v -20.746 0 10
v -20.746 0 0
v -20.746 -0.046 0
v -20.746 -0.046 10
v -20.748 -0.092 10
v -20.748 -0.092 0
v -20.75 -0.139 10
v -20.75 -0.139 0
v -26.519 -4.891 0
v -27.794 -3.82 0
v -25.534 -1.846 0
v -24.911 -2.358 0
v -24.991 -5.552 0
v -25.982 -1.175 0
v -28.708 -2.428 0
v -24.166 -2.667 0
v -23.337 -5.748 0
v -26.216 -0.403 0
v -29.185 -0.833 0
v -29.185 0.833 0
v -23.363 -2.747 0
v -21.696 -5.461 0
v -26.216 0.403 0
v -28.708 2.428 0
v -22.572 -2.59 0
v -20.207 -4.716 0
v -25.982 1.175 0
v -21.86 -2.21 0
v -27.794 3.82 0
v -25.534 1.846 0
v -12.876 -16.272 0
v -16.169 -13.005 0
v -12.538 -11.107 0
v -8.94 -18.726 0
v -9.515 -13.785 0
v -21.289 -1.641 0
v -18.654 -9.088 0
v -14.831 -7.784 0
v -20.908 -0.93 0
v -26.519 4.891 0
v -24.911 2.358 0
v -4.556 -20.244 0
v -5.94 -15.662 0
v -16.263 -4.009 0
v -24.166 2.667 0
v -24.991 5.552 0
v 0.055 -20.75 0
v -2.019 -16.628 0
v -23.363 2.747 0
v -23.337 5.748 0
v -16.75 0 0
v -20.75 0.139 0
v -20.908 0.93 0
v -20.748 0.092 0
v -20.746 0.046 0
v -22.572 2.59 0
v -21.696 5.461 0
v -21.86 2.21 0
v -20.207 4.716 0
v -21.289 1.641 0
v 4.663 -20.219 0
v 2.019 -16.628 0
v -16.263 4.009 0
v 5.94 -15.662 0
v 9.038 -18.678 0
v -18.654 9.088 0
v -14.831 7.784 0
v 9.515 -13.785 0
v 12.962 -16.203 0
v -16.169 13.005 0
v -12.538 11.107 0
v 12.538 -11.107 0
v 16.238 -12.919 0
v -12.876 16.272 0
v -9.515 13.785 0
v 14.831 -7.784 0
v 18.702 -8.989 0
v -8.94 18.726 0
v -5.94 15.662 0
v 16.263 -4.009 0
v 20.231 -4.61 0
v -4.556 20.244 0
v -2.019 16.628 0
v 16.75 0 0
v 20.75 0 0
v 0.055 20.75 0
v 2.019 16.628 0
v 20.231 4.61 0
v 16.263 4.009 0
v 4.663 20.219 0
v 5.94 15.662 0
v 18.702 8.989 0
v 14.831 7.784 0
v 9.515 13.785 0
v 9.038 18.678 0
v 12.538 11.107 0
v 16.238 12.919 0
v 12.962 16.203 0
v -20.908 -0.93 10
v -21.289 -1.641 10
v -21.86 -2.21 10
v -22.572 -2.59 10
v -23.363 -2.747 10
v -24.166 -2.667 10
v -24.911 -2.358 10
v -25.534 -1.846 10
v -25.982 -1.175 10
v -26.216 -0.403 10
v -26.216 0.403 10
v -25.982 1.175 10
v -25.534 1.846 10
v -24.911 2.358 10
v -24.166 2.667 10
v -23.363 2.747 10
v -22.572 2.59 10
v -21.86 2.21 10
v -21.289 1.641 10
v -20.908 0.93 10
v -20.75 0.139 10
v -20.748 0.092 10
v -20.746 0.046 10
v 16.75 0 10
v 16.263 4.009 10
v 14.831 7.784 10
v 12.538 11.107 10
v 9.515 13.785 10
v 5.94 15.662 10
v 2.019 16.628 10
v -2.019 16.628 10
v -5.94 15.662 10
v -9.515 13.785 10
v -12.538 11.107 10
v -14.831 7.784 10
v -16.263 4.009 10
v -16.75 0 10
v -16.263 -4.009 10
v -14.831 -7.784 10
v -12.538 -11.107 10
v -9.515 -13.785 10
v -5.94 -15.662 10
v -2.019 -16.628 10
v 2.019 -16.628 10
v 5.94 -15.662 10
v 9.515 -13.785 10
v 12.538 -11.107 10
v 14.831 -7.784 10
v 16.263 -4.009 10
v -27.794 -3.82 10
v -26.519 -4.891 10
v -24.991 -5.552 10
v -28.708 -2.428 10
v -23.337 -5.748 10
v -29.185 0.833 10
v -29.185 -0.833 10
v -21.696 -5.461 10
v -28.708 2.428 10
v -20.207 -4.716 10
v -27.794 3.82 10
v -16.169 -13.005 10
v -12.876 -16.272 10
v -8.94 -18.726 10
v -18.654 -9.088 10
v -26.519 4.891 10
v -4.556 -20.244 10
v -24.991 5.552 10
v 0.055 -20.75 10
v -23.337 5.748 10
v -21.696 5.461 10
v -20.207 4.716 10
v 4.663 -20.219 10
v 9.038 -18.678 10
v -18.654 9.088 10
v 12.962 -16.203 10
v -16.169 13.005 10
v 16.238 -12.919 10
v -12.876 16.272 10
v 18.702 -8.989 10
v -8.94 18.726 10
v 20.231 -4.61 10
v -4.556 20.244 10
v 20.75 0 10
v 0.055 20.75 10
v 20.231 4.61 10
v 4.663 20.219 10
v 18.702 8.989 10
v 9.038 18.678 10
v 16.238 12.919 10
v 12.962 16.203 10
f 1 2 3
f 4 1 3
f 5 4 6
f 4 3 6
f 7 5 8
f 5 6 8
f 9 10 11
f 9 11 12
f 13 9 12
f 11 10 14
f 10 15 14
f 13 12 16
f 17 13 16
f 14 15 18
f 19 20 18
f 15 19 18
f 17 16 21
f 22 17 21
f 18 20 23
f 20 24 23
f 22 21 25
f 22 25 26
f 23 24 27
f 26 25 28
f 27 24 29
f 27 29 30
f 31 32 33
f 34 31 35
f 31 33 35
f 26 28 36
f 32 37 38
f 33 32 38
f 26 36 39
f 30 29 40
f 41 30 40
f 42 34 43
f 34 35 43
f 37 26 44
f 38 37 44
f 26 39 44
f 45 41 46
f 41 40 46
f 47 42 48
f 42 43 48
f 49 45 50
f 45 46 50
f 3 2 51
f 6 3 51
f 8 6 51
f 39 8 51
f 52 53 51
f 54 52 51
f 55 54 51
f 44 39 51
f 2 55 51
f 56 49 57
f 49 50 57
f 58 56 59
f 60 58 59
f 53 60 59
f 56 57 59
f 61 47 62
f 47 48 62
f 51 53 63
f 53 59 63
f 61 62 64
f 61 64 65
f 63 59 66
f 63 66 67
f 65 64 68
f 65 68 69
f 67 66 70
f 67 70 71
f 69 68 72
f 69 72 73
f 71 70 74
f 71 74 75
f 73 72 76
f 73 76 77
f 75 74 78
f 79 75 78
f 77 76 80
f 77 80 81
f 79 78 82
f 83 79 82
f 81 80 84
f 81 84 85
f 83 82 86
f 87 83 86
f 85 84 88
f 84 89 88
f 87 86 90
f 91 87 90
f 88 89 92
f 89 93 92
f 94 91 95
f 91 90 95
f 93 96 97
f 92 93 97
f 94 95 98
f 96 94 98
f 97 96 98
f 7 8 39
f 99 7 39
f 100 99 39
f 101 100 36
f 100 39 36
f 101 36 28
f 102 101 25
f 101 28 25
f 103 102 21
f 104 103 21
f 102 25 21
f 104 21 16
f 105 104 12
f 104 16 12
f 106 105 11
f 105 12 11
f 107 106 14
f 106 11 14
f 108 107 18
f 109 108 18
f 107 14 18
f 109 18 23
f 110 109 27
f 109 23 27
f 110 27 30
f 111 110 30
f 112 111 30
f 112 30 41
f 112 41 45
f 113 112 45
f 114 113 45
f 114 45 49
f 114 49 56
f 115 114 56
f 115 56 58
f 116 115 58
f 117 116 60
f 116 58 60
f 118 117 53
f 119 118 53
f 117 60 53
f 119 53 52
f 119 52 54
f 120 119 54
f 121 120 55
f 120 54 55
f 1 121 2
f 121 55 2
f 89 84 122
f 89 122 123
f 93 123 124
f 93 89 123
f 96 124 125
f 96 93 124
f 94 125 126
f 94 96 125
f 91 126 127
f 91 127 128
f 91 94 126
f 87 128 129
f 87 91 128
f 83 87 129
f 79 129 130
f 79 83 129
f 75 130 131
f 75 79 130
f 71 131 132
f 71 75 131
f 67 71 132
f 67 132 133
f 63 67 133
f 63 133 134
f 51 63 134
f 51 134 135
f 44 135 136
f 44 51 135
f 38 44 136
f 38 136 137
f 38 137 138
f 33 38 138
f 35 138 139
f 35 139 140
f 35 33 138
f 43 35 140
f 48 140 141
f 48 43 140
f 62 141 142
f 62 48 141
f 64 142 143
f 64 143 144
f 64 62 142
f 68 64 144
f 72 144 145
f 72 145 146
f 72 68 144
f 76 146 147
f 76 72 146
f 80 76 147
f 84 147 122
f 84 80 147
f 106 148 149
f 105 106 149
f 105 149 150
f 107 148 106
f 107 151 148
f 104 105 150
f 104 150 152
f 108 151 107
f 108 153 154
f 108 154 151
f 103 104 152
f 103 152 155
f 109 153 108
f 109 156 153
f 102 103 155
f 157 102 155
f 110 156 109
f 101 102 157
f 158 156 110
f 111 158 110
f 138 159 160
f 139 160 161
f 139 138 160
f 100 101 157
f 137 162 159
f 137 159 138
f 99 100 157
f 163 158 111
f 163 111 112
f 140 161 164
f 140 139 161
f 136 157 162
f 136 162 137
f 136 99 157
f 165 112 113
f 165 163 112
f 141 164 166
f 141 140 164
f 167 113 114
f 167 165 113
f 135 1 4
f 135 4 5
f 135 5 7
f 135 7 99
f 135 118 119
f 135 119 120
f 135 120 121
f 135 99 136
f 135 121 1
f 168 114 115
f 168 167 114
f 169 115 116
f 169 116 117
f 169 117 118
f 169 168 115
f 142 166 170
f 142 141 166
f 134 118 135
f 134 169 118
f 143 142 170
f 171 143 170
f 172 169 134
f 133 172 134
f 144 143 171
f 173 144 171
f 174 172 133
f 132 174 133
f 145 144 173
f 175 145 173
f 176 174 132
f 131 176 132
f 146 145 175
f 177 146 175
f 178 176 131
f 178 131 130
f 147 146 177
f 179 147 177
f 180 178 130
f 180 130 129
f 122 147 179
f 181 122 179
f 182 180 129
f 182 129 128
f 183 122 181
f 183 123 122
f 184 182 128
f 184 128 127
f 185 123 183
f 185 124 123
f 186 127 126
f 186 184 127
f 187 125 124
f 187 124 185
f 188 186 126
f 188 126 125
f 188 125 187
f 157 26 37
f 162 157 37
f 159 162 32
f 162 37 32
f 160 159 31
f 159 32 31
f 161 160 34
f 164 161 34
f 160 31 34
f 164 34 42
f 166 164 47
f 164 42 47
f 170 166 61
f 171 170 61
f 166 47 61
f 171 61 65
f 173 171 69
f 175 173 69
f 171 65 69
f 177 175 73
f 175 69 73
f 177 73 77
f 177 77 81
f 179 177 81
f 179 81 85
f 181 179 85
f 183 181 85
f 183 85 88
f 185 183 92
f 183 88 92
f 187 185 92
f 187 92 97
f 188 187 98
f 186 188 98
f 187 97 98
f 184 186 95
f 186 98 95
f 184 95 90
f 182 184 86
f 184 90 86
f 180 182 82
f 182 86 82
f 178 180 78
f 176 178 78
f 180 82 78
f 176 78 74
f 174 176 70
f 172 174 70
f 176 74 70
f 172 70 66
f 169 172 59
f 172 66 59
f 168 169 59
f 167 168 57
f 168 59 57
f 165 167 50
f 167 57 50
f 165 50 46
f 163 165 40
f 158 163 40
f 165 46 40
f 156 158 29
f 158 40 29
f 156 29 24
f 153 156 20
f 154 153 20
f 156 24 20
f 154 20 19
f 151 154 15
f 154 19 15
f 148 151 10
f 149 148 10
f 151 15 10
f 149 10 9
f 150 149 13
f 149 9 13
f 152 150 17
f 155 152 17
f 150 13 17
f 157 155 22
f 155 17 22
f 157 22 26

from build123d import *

# Parameters (mm, degrees)
F0_R     = 16.75
F1_DEPTH = 10


with BuildPart() as f1:
    # F0 (on Top) → F1 (new body)
    with BuildSketch(Plane.XY):
        with BuildLine():
            ThreePointArc((-20.206893, -4.716353), (20.75, 0), (-20.206893, 4.716353))
            ThreePointArc((-20.206893, 4.716353), (-29.246043, 0), (-20.206893, -4.716353))
        make_face()
        with BuildLine():
            ThreePointArc((-20.749537, -0.138584), (-26.246043, 0), (-20.749537, 0.138584))
            ThreePointArc((-20.749537, 0.138584), (-20.746917, 0.069314), (-20.746043, 0))
            ThreePointArc((-20.746043, 0), (-20.746917, -0.069314), (-20.749537, -0.138584))
        make_face(mode=Mode.SUBTRACT)
        Circle(F0_R, mode=Mode.SUBTRACT)
    extrude(amount=F1_DEPTH)


solid = f1.part
